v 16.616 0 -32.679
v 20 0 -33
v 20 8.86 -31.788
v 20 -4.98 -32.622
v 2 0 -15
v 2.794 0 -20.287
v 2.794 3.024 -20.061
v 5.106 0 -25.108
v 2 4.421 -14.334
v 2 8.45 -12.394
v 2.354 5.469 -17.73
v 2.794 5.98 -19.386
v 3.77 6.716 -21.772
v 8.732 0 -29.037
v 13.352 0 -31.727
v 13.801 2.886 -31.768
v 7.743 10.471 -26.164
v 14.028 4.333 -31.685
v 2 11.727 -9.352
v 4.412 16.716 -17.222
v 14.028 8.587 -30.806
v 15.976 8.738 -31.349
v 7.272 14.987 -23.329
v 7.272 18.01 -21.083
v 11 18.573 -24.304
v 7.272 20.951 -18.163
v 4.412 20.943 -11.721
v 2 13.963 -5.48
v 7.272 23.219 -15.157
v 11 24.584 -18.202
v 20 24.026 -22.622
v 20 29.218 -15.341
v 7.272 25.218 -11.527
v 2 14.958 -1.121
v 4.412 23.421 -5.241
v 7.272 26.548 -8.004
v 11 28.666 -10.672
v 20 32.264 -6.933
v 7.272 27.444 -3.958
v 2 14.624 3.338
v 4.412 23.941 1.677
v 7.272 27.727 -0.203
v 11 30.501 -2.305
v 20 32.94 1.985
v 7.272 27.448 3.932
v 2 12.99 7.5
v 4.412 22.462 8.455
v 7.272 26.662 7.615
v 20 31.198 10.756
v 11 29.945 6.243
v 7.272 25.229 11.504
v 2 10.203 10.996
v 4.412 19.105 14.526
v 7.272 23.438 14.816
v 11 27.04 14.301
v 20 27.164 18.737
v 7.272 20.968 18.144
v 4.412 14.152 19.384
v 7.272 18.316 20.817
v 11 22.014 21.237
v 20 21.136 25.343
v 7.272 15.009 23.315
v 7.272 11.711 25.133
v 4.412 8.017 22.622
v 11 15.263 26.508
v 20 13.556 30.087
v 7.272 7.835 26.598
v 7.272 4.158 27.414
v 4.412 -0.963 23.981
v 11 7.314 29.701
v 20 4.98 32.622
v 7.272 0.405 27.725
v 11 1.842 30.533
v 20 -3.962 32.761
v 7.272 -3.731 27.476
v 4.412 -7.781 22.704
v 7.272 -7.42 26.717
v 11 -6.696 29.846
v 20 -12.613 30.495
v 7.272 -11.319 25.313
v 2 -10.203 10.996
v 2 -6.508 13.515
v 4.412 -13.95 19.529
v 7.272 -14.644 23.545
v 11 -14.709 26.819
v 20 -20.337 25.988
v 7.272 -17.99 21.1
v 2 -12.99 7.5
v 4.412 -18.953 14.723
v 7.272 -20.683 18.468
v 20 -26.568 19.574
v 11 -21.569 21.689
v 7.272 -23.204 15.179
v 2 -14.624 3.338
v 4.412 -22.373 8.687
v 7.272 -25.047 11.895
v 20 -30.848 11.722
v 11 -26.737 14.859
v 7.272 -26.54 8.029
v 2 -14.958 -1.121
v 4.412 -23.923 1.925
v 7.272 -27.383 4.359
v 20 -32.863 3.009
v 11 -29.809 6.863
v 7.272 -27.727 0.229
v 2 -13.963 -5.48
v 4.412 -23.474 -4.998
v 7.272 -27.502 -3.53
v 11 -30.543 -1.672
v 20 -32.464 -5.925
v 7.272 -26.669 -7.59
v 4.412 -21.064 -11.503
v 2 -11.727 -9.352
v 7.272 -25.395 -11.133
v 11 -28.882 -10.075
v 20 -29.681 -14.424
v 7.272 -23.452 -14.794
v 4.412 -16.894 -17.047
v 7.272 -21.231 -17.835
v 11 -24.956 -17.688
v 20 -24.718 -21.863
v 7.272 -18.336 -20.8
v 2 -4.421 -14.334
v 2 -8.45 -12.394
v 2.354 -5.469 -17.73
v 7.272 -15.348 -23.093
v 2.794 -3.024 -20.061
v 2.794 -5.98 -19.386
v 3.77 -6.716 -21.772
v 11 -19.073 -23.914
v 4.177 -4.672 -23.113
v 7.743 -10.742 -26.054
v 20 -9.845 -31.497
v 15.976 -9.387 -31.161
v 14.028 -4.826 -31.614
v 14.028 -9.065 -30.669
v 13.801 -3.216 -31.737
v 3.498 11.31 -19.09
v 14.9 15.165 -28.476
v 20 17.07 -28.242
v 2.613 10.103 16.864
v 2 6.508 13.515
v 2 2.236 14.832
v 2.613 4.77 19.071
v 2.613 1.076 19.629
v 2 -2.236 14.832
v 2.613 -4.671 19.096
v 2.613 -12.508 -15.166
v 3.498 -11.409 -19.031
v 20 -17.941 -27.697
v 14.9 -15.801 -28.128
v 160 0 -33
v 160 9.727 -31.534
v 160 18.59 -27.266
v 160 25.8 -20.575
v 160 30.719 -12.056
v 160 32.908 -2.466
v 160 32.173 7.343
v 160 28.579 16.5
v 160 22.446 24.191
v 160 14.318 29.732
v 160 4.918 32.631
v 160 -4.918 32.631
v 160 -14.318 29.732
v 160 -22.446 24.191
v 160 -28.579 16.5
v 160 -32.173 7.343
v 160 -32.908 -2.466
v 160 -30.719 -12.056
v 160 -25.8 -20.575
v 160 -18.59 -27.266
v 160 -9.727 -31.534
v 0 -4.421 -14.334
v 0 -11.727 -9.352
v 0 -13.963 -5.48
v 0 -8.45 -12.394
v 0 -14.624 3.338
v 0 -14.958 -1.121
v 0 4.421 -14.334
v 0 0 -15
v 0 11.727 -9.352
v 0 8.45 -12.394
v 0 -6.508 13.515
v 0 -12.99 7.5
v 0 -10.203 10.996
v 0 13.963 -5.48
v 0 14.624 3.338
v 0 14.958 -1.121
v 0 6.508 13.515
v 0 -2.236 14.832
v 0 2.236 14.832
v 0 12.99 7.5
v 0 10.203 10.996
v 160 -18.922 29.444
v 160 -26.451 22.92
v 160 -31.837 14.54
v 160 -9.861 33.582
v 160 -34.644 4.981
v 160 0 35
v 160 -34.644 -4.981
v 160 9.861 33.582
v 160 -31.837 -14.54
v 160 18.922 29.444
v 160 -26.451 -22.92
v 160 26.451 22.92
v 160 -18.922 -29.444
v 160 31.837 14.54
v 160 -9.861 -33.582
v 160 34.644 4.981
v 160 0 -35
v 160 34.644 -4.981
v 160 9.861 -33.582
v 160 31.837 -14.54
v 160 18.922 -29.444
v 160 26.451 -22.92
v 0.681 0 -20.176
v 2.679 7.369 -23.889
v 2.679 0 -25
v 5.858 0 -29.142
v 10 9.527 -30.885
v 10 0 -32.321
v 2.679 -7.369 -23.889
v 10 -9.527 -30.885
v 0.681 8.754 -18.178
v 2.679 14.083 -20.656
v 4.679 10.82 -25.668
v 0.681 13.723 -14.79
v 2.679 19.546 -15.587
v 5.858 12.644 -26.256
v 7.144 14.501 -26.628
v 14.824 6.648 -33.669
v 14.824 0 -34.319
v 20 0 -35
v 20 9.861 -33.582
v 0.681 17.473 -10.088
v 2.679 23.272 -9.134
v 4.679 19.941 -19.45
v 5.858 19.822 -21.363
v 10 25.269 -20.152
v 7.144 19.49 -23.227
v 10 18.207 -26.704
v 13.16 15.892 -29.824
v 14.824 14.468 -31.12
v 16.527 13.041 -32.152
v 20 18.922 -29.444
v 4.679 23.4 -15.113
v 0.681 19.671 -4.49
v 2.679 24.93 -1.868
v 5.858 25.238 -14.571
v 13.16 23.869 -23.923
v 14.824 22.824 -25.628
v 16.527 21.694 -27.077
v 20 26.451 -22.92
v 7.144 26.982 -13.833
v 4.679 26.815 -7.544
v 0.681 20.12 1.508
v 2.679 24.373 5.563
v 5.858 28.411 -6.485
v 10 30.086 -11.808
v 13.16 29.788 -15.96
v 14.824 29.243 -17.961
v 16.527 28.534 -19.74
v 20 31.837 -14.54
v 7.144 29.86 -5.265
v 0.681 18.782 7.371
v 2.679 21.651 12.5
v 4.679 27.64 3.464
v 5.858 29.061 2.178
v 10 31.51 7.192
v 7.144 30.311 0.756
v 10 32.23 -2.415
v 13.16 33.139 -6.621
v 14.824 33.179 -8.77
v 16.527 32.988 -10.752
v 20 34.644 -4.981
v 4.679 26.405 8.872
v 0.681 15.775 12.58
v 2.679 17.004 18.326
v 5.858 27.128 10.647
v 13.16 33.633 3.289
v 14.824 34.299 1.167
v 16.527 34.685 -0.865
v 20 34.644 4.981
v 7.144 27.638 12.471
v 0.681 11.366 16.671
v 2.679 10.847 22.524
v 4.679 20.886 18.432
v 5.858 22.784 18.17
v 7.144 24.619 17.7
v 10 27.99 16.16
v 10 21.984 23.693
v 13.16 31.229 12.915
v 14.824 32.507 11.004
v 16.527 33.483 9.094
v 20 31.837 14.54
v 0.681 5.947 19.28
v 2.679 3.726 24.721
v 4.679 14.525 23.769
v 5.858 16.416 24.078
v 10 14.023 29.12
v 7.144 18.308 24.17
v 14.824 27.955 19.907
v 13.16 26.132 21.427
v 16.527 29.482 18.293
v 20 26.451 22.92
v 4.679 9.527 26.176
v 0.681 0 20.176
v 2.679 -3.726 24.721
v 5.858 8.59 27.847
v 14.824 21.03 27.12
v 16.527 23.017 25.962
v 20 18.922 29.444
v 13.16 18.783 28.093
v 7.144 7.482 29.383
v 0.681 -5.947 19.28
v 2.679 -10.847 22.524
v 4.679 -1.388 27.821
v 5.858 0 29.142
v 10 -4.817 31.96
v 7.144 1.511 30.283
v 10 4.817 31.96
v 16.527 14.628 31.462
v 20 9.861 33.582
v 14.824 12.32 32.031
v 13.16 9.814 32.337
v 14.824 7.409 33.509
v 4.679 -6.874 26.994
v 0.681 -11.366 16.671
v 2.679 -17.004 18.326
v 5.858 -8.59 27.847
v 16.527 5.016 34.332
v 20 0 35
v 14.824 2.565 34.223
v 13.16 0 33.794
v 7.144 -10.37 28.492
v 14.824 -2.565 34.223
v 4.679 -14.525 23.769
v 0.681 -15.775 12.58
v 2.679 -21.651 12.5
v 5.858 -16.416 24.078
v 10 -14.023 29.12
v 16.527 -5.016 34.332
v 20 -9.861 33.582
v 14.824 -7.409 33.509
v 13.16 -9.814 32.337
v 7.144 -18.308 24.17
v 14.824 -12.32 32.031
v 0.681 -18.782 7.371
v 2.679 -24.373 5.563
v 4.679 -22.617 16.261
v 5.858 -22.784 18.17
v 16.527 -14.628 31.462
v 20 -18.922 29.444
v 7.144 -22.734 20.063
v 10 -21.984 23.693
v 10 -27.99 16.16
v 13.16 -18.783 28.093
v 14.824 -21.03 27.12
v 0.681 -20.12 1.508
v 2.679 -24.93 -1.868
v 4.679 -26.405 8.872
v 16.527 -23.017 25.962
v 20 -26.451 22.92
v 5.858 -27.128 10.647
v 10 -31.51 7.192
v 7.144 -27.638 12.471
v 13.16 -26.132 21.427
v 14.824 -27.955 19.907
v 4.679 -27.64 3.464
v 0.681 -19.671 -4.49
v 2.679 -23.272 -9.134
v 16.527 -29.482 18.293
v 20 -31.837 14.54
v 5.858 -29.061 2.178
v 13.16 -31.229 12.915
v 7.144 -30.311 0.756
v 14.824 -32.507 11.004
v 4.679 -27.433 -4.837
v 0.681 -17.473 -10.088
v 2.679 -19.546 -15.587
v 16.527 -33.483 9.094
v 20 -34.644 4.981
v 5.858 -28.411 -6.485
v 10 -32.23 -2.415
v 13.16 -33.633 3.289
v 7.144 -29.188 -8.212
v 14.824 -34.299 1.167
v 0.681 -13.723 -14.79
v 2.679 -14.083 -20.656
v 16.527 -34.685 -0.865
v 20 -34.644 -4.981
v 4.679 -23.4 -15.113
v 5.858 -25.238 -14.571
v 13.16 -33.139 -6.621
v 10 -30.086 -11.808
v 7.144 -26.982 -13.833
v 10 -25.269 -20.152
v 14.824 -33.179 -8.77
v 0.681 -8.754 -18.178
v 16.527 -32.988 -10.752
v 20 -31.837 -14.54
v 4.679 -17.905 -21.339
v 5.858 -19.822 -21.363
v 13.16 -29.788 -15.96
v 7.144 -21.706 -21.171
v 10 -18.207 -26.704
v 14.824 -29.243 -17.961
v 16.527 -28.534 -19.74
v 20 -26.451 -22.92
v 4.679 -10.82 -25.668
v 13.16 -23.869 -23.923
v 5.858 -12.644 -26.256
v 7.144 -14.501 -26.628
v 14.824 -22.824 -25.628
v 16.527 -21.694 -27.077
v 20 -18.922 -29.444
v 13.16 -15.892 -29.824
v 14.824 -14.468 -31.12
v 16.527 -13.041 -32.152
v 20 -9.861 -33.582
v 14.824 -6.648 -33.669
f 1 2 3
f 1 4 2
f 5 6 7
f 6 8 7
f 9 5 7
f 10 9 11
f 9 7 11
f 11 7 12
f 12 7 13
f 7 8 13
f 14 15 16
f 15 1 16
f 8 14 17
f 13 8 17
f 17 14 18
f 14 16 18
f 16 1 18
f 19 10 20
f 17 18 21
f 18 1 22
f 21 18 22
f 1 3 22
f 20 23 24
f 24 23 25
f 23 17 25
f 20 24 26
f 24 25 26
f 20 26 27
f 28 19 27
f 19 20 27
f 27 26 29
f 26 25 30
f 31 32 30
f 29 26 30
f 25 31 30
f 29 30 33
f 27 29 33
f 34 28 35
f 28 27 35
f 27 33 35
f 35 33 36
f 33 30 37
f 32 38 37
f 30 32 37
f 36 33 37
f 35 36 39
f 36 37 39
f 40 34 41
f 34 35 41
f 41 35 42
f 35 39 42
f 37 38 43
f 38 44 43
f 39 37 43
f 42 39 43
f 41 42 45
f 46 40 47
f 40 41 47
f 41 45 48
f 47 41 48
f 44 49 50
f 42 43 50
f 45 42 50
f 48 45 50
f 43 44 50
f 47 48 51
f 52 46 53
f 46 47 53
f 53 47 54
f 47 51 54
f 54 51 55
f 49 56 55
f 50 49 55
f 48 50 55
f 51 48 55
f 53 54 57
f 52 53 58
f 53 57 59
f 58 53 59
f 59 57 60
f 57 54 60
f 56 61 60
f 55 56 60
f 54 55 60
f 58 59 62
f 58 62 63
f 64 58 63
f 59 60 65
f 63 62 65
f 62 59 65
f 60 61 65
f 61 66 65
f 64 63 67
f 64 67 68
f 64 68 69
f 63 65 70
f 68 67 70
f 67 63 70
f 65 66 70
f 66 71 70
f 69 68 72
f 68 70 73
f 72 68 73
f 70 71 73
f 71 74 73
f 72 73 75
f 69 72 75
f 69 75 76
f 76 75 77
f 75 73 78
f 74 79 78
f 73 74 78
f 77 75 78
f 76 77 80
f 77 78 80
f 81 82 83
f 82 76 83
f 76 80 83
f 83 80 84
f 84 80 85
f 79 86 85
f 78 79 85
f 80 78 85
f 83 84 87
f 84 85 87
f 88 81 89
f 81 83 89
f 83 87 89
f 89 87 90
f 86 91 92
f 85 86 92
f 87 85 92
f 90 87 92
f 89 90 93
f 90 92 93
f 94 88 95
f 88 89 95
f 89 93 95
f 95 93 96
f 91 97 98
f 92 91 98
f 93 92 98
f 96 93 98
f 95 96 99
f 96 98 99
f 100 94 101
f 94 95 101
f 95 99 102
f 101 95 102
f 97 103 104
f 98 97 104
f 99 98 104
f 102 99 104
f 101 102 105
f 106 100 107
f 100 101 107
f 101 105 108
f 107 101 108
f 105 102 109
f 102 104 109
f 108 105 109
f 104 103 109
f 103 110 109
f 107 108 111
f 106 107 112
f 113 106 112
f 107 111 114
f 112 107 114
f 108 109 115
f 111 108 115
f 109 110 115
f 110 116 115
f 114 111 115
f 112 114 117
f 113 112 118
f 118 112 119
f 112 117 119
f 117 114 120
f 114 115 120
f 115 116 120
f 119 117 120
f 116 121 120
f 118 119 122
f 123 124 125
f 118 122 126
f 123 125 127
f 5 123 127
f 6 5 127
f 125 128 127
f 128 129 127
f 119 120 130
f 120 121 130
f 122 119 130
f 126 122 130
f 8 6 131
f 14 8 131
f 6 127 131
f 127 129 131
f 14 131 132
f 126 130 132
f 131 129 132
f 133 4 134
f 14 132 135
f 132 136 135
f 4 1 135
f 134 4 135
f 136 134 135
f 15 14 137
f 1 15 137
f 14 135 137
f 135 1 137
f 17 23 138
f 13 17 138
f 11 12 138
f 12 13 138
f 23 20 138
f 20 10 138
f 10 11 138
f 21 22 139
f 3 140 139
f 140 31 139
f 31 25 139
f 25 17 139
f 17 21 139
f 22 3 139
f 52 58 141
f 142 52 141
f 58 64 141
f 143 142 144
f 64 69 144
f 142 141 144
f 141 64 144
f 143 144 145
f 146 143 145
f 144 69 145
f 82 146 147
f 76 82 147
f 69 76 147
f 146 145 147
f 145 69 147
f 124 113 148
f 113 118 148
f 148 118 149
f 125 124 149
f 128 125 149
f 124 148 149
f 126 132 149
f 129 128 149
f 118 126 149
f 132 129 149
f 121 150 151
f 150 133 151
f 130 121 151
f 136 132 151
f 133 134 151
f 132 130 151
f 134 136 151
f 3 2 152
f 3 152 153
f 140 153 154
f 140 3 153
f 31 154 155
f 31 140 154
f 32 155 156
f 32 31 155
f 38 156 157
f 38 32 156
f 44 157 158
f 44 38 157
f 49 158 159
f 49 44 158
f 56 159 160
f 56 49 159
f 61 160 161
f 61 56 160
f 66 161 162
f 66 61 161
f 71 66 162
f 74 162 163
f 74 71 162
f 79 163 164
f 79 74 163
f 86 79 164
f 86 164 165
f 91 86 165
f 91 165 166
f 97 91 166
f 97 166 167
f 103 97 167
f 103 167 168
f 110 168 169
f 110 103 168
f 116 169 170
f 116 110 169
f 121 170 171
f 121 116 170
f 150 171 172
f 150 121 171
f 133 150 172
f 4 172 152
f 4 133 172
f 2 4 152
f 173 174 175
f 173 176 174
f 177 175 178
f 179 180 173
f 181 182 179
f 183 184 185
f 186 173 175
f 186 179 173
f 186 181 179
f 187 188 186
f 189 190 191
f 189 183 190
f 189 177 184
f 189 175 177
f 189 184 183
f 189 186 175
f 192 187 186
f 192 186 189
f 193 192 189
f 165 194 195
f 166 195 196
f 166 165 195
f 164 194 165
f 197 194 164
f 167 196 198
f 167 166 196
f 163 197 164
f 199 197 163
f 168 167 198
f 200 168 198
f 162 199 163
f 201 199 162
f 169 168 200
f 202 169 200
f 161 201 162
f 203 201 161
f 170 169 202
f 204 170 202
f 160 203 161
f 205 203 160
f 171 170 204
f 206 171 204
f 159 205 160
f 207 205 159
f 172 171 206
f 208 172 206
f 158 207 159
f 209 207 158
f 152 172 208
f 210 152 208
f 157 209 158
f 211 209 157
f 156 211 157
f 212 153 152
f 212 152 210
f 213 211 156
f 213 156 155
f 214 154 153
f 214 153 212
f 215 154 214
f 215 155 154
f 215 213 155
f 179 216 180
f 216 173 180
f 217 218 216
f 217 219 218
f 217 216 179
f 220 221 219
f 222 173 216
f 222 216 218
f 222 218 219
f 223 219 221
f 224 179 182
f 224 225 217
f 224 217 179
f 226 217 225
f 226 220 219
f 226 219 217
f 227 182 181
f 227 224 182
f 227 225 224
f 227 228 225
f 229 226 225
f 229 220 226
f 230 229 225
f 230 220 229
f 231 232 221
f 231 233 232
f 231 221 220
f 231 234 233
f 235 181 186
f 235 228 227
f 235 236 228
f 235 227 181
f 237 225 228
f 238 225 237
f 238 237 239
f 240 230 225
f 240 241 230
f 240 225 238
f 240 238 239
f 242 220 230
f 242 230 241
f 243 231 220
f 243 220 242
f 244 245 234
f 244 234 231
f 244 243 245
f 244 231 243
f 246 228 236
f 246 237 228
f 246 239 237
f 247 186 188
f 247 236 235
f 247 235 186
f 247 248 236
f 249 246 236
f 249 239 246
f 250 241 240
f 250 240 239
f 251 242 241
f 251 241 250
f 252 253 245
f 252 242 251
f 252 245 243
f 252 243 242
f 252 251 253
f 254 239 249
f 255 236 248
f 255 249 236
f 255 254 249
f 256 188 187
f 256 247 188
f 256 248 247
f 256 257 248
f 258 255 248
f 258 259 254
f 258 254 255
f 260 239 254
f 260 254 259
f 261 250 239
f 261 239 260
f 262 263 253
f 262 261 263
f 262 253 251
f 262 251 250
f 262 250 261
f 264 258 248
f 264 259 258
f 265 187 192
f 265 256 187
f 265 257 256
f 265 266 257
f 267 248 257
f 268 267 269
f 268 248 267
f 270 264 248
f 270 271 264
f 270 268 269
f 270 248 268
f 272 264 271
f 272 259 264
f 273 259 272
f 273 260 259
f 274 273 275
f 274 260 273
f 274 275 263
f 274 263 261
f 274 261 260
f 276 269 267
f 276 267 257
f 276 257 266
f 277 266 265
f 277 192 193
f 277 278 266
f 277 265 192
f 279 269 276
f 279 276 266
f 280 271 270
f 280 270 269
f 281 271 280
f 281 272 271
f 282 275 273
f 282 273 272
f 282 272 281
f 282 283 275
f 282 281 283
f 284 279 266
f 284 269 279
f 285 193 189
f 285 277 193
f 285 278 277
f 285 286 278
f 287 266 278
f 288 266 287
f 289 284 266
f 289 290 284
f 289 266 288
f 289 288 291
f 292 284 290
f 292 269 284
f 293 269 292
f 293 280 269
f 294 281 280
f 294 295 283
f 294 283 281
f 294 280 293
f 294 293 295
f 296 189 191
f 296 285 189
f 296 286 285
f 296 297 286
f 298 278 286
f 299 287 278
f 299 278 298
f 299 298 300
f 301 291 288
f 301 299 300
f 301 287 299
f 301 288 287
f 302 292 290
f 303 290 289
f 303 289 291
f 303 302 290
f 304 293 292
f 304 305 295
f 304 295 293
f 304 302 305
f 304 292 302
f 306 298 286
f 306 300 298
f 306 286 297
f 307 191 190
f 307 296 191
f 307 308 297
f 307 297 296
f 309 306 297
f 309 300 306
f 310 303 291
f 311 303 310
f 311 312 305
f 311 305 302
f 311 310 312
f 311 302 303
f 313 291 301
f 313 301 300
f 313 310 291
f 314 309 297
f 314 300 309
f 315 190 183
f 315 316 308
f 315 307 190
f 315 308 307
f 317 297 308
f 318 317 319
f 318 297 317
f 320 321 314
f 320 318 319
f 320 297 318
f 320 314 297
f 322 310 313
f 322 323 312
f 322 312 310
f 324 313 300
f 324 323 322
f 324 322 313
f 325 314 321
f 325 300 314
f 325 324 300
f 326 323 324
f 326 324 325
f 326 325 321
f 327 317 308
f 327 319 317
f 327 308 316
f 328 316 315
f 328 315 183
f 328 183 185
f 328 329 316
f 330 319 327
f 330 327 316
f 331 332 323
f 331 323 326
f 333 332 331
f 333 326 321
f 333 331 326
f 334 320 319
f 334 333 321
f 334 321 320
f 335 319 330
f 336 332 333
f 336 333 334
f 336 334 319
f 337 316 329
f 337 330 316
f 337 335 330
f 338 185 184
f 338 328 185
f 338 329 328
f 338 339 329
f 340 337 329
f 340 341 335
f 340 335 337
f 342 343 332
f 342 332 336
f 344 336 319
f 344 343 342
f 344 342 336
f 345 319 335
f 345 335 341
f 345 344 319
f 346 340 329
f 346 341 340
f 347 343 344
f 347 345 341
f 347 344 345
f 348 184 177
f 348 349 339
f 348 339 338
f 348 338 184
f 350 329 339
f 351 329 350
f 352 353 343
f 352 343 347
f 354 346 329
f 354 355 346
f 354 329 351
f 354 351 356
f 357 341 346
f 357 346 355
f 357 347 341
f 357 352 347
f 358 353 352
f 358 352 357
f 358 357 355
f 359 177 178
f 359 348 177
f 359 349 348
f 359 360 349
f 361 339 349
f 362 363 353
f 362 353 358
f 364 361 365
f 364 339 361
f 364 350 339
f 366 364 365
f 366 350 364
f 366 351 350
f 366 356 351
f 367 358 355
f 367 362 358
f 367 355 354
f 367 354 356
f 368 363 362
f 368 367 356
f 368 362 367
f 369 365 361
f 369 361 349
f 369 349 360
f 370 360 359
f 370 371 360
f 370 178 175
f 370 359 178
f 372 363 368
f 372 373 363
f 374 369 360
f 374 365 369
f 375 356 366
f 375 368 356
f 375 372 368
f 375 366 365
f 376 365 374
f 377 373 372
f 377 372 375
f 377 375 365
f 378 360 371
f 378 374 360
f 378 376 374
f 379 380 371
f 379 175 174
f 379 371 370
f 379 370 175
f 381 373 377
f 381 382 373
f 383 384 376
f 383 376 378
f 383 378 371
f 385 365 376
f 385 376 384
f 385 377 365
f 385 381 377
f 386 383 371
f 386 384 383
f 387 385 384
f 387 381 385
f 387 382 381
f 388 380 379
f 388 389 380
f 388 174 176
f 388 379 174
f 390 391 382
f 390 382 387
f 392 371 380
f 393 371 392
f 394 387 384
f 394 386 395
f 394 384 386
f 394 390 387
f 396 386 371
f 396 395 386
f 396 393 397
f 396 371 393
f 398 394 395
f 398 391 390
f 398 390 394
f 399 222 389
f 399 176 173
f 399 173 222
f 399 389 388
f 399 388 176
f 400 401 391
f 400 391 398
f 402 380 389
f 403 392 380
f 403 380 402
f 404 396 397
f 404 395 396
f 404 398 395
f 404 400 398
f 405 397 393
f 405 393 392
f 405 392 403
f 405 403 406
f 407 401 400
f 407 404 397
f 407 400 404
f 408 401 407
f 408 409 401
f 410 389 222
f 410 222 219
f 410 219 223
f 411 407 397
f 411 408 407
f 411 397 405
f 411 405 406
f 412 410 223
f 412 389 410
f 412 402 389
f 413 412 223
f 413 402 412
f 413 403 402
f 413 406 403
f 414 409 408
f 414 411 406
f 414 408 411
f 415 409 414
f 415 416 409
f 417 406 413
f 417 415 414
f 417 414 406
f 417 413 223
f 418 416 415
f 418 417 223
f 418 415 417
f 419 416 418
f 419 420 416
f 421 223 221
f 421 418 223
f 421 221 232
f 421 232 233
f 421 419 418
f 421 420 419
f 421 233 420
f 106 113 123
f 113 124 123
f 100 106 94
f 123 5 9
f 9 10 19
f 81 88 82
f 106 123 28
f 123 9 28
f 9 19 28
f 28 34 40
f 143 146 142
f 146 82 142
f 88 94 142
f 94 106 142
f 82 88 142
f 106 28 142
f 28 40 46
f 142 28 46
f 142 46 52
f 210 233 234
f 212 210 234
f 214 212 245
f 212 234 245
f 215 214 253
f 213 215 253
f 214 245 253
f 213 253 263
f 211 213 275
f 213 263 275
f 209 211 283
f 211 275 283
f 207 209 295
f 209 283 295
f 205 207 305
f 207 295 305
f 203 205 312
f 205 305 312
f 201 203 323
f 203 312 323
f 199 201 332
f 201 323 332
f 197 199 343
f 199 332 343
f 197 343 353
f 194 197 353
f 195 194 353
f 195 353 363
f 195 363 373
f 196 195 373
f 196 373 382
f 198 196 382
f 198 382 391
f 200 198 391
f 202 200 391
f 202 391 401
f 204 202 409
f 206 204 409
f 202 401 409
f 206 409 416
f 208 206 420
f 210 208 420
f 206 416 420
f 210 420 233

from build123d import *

# Parameters (mm, degrees)
THICKEN1_T2         = 2
SKETCH2_R           = 35
SKETCH2_R_2         = 33
BOSS_EXTRUDE1_DEPTH = 140


with BuildPart() as body_1:
    # Surface-Revolve1: a surface, the sketch's curves turned about an axis
    with BuildLine(Plane(origin=(0, 0, 0), x_dir=(1, 0, 0), z_dir=(0, 1, 0)), mode=Mode.PRIVATE) as surface_revolve1_1_path:
        Line((0, 0), (0, 15))
        ThreePointArc((0, 15), (5.857864376, 29.142135624), (20, 35))
    surface_revolve1_1 = Shell.revolve(surface_revolve1_1_path.wire(), 360, Axis((0, 0, 0), (1, 0, 0)))
    add(Solid.thicken(surface_revolve1_1, -THICKEN1_T2))

    # Sketch2 → Boss-Extrude1 (add)
    with BuildSketch(Plane(origin=(20, 0, 0), x_dir=(0, 0, -1), z_dir=(1, 0, 0))):
        Circle(SKETCH2_R)
        Circle(SKETCH2_R_2, mode=Mode.SUBTRACT)
    extrude(amount=BOSS_EXTRUDE1_DEPTH)


solid = body_1.part
